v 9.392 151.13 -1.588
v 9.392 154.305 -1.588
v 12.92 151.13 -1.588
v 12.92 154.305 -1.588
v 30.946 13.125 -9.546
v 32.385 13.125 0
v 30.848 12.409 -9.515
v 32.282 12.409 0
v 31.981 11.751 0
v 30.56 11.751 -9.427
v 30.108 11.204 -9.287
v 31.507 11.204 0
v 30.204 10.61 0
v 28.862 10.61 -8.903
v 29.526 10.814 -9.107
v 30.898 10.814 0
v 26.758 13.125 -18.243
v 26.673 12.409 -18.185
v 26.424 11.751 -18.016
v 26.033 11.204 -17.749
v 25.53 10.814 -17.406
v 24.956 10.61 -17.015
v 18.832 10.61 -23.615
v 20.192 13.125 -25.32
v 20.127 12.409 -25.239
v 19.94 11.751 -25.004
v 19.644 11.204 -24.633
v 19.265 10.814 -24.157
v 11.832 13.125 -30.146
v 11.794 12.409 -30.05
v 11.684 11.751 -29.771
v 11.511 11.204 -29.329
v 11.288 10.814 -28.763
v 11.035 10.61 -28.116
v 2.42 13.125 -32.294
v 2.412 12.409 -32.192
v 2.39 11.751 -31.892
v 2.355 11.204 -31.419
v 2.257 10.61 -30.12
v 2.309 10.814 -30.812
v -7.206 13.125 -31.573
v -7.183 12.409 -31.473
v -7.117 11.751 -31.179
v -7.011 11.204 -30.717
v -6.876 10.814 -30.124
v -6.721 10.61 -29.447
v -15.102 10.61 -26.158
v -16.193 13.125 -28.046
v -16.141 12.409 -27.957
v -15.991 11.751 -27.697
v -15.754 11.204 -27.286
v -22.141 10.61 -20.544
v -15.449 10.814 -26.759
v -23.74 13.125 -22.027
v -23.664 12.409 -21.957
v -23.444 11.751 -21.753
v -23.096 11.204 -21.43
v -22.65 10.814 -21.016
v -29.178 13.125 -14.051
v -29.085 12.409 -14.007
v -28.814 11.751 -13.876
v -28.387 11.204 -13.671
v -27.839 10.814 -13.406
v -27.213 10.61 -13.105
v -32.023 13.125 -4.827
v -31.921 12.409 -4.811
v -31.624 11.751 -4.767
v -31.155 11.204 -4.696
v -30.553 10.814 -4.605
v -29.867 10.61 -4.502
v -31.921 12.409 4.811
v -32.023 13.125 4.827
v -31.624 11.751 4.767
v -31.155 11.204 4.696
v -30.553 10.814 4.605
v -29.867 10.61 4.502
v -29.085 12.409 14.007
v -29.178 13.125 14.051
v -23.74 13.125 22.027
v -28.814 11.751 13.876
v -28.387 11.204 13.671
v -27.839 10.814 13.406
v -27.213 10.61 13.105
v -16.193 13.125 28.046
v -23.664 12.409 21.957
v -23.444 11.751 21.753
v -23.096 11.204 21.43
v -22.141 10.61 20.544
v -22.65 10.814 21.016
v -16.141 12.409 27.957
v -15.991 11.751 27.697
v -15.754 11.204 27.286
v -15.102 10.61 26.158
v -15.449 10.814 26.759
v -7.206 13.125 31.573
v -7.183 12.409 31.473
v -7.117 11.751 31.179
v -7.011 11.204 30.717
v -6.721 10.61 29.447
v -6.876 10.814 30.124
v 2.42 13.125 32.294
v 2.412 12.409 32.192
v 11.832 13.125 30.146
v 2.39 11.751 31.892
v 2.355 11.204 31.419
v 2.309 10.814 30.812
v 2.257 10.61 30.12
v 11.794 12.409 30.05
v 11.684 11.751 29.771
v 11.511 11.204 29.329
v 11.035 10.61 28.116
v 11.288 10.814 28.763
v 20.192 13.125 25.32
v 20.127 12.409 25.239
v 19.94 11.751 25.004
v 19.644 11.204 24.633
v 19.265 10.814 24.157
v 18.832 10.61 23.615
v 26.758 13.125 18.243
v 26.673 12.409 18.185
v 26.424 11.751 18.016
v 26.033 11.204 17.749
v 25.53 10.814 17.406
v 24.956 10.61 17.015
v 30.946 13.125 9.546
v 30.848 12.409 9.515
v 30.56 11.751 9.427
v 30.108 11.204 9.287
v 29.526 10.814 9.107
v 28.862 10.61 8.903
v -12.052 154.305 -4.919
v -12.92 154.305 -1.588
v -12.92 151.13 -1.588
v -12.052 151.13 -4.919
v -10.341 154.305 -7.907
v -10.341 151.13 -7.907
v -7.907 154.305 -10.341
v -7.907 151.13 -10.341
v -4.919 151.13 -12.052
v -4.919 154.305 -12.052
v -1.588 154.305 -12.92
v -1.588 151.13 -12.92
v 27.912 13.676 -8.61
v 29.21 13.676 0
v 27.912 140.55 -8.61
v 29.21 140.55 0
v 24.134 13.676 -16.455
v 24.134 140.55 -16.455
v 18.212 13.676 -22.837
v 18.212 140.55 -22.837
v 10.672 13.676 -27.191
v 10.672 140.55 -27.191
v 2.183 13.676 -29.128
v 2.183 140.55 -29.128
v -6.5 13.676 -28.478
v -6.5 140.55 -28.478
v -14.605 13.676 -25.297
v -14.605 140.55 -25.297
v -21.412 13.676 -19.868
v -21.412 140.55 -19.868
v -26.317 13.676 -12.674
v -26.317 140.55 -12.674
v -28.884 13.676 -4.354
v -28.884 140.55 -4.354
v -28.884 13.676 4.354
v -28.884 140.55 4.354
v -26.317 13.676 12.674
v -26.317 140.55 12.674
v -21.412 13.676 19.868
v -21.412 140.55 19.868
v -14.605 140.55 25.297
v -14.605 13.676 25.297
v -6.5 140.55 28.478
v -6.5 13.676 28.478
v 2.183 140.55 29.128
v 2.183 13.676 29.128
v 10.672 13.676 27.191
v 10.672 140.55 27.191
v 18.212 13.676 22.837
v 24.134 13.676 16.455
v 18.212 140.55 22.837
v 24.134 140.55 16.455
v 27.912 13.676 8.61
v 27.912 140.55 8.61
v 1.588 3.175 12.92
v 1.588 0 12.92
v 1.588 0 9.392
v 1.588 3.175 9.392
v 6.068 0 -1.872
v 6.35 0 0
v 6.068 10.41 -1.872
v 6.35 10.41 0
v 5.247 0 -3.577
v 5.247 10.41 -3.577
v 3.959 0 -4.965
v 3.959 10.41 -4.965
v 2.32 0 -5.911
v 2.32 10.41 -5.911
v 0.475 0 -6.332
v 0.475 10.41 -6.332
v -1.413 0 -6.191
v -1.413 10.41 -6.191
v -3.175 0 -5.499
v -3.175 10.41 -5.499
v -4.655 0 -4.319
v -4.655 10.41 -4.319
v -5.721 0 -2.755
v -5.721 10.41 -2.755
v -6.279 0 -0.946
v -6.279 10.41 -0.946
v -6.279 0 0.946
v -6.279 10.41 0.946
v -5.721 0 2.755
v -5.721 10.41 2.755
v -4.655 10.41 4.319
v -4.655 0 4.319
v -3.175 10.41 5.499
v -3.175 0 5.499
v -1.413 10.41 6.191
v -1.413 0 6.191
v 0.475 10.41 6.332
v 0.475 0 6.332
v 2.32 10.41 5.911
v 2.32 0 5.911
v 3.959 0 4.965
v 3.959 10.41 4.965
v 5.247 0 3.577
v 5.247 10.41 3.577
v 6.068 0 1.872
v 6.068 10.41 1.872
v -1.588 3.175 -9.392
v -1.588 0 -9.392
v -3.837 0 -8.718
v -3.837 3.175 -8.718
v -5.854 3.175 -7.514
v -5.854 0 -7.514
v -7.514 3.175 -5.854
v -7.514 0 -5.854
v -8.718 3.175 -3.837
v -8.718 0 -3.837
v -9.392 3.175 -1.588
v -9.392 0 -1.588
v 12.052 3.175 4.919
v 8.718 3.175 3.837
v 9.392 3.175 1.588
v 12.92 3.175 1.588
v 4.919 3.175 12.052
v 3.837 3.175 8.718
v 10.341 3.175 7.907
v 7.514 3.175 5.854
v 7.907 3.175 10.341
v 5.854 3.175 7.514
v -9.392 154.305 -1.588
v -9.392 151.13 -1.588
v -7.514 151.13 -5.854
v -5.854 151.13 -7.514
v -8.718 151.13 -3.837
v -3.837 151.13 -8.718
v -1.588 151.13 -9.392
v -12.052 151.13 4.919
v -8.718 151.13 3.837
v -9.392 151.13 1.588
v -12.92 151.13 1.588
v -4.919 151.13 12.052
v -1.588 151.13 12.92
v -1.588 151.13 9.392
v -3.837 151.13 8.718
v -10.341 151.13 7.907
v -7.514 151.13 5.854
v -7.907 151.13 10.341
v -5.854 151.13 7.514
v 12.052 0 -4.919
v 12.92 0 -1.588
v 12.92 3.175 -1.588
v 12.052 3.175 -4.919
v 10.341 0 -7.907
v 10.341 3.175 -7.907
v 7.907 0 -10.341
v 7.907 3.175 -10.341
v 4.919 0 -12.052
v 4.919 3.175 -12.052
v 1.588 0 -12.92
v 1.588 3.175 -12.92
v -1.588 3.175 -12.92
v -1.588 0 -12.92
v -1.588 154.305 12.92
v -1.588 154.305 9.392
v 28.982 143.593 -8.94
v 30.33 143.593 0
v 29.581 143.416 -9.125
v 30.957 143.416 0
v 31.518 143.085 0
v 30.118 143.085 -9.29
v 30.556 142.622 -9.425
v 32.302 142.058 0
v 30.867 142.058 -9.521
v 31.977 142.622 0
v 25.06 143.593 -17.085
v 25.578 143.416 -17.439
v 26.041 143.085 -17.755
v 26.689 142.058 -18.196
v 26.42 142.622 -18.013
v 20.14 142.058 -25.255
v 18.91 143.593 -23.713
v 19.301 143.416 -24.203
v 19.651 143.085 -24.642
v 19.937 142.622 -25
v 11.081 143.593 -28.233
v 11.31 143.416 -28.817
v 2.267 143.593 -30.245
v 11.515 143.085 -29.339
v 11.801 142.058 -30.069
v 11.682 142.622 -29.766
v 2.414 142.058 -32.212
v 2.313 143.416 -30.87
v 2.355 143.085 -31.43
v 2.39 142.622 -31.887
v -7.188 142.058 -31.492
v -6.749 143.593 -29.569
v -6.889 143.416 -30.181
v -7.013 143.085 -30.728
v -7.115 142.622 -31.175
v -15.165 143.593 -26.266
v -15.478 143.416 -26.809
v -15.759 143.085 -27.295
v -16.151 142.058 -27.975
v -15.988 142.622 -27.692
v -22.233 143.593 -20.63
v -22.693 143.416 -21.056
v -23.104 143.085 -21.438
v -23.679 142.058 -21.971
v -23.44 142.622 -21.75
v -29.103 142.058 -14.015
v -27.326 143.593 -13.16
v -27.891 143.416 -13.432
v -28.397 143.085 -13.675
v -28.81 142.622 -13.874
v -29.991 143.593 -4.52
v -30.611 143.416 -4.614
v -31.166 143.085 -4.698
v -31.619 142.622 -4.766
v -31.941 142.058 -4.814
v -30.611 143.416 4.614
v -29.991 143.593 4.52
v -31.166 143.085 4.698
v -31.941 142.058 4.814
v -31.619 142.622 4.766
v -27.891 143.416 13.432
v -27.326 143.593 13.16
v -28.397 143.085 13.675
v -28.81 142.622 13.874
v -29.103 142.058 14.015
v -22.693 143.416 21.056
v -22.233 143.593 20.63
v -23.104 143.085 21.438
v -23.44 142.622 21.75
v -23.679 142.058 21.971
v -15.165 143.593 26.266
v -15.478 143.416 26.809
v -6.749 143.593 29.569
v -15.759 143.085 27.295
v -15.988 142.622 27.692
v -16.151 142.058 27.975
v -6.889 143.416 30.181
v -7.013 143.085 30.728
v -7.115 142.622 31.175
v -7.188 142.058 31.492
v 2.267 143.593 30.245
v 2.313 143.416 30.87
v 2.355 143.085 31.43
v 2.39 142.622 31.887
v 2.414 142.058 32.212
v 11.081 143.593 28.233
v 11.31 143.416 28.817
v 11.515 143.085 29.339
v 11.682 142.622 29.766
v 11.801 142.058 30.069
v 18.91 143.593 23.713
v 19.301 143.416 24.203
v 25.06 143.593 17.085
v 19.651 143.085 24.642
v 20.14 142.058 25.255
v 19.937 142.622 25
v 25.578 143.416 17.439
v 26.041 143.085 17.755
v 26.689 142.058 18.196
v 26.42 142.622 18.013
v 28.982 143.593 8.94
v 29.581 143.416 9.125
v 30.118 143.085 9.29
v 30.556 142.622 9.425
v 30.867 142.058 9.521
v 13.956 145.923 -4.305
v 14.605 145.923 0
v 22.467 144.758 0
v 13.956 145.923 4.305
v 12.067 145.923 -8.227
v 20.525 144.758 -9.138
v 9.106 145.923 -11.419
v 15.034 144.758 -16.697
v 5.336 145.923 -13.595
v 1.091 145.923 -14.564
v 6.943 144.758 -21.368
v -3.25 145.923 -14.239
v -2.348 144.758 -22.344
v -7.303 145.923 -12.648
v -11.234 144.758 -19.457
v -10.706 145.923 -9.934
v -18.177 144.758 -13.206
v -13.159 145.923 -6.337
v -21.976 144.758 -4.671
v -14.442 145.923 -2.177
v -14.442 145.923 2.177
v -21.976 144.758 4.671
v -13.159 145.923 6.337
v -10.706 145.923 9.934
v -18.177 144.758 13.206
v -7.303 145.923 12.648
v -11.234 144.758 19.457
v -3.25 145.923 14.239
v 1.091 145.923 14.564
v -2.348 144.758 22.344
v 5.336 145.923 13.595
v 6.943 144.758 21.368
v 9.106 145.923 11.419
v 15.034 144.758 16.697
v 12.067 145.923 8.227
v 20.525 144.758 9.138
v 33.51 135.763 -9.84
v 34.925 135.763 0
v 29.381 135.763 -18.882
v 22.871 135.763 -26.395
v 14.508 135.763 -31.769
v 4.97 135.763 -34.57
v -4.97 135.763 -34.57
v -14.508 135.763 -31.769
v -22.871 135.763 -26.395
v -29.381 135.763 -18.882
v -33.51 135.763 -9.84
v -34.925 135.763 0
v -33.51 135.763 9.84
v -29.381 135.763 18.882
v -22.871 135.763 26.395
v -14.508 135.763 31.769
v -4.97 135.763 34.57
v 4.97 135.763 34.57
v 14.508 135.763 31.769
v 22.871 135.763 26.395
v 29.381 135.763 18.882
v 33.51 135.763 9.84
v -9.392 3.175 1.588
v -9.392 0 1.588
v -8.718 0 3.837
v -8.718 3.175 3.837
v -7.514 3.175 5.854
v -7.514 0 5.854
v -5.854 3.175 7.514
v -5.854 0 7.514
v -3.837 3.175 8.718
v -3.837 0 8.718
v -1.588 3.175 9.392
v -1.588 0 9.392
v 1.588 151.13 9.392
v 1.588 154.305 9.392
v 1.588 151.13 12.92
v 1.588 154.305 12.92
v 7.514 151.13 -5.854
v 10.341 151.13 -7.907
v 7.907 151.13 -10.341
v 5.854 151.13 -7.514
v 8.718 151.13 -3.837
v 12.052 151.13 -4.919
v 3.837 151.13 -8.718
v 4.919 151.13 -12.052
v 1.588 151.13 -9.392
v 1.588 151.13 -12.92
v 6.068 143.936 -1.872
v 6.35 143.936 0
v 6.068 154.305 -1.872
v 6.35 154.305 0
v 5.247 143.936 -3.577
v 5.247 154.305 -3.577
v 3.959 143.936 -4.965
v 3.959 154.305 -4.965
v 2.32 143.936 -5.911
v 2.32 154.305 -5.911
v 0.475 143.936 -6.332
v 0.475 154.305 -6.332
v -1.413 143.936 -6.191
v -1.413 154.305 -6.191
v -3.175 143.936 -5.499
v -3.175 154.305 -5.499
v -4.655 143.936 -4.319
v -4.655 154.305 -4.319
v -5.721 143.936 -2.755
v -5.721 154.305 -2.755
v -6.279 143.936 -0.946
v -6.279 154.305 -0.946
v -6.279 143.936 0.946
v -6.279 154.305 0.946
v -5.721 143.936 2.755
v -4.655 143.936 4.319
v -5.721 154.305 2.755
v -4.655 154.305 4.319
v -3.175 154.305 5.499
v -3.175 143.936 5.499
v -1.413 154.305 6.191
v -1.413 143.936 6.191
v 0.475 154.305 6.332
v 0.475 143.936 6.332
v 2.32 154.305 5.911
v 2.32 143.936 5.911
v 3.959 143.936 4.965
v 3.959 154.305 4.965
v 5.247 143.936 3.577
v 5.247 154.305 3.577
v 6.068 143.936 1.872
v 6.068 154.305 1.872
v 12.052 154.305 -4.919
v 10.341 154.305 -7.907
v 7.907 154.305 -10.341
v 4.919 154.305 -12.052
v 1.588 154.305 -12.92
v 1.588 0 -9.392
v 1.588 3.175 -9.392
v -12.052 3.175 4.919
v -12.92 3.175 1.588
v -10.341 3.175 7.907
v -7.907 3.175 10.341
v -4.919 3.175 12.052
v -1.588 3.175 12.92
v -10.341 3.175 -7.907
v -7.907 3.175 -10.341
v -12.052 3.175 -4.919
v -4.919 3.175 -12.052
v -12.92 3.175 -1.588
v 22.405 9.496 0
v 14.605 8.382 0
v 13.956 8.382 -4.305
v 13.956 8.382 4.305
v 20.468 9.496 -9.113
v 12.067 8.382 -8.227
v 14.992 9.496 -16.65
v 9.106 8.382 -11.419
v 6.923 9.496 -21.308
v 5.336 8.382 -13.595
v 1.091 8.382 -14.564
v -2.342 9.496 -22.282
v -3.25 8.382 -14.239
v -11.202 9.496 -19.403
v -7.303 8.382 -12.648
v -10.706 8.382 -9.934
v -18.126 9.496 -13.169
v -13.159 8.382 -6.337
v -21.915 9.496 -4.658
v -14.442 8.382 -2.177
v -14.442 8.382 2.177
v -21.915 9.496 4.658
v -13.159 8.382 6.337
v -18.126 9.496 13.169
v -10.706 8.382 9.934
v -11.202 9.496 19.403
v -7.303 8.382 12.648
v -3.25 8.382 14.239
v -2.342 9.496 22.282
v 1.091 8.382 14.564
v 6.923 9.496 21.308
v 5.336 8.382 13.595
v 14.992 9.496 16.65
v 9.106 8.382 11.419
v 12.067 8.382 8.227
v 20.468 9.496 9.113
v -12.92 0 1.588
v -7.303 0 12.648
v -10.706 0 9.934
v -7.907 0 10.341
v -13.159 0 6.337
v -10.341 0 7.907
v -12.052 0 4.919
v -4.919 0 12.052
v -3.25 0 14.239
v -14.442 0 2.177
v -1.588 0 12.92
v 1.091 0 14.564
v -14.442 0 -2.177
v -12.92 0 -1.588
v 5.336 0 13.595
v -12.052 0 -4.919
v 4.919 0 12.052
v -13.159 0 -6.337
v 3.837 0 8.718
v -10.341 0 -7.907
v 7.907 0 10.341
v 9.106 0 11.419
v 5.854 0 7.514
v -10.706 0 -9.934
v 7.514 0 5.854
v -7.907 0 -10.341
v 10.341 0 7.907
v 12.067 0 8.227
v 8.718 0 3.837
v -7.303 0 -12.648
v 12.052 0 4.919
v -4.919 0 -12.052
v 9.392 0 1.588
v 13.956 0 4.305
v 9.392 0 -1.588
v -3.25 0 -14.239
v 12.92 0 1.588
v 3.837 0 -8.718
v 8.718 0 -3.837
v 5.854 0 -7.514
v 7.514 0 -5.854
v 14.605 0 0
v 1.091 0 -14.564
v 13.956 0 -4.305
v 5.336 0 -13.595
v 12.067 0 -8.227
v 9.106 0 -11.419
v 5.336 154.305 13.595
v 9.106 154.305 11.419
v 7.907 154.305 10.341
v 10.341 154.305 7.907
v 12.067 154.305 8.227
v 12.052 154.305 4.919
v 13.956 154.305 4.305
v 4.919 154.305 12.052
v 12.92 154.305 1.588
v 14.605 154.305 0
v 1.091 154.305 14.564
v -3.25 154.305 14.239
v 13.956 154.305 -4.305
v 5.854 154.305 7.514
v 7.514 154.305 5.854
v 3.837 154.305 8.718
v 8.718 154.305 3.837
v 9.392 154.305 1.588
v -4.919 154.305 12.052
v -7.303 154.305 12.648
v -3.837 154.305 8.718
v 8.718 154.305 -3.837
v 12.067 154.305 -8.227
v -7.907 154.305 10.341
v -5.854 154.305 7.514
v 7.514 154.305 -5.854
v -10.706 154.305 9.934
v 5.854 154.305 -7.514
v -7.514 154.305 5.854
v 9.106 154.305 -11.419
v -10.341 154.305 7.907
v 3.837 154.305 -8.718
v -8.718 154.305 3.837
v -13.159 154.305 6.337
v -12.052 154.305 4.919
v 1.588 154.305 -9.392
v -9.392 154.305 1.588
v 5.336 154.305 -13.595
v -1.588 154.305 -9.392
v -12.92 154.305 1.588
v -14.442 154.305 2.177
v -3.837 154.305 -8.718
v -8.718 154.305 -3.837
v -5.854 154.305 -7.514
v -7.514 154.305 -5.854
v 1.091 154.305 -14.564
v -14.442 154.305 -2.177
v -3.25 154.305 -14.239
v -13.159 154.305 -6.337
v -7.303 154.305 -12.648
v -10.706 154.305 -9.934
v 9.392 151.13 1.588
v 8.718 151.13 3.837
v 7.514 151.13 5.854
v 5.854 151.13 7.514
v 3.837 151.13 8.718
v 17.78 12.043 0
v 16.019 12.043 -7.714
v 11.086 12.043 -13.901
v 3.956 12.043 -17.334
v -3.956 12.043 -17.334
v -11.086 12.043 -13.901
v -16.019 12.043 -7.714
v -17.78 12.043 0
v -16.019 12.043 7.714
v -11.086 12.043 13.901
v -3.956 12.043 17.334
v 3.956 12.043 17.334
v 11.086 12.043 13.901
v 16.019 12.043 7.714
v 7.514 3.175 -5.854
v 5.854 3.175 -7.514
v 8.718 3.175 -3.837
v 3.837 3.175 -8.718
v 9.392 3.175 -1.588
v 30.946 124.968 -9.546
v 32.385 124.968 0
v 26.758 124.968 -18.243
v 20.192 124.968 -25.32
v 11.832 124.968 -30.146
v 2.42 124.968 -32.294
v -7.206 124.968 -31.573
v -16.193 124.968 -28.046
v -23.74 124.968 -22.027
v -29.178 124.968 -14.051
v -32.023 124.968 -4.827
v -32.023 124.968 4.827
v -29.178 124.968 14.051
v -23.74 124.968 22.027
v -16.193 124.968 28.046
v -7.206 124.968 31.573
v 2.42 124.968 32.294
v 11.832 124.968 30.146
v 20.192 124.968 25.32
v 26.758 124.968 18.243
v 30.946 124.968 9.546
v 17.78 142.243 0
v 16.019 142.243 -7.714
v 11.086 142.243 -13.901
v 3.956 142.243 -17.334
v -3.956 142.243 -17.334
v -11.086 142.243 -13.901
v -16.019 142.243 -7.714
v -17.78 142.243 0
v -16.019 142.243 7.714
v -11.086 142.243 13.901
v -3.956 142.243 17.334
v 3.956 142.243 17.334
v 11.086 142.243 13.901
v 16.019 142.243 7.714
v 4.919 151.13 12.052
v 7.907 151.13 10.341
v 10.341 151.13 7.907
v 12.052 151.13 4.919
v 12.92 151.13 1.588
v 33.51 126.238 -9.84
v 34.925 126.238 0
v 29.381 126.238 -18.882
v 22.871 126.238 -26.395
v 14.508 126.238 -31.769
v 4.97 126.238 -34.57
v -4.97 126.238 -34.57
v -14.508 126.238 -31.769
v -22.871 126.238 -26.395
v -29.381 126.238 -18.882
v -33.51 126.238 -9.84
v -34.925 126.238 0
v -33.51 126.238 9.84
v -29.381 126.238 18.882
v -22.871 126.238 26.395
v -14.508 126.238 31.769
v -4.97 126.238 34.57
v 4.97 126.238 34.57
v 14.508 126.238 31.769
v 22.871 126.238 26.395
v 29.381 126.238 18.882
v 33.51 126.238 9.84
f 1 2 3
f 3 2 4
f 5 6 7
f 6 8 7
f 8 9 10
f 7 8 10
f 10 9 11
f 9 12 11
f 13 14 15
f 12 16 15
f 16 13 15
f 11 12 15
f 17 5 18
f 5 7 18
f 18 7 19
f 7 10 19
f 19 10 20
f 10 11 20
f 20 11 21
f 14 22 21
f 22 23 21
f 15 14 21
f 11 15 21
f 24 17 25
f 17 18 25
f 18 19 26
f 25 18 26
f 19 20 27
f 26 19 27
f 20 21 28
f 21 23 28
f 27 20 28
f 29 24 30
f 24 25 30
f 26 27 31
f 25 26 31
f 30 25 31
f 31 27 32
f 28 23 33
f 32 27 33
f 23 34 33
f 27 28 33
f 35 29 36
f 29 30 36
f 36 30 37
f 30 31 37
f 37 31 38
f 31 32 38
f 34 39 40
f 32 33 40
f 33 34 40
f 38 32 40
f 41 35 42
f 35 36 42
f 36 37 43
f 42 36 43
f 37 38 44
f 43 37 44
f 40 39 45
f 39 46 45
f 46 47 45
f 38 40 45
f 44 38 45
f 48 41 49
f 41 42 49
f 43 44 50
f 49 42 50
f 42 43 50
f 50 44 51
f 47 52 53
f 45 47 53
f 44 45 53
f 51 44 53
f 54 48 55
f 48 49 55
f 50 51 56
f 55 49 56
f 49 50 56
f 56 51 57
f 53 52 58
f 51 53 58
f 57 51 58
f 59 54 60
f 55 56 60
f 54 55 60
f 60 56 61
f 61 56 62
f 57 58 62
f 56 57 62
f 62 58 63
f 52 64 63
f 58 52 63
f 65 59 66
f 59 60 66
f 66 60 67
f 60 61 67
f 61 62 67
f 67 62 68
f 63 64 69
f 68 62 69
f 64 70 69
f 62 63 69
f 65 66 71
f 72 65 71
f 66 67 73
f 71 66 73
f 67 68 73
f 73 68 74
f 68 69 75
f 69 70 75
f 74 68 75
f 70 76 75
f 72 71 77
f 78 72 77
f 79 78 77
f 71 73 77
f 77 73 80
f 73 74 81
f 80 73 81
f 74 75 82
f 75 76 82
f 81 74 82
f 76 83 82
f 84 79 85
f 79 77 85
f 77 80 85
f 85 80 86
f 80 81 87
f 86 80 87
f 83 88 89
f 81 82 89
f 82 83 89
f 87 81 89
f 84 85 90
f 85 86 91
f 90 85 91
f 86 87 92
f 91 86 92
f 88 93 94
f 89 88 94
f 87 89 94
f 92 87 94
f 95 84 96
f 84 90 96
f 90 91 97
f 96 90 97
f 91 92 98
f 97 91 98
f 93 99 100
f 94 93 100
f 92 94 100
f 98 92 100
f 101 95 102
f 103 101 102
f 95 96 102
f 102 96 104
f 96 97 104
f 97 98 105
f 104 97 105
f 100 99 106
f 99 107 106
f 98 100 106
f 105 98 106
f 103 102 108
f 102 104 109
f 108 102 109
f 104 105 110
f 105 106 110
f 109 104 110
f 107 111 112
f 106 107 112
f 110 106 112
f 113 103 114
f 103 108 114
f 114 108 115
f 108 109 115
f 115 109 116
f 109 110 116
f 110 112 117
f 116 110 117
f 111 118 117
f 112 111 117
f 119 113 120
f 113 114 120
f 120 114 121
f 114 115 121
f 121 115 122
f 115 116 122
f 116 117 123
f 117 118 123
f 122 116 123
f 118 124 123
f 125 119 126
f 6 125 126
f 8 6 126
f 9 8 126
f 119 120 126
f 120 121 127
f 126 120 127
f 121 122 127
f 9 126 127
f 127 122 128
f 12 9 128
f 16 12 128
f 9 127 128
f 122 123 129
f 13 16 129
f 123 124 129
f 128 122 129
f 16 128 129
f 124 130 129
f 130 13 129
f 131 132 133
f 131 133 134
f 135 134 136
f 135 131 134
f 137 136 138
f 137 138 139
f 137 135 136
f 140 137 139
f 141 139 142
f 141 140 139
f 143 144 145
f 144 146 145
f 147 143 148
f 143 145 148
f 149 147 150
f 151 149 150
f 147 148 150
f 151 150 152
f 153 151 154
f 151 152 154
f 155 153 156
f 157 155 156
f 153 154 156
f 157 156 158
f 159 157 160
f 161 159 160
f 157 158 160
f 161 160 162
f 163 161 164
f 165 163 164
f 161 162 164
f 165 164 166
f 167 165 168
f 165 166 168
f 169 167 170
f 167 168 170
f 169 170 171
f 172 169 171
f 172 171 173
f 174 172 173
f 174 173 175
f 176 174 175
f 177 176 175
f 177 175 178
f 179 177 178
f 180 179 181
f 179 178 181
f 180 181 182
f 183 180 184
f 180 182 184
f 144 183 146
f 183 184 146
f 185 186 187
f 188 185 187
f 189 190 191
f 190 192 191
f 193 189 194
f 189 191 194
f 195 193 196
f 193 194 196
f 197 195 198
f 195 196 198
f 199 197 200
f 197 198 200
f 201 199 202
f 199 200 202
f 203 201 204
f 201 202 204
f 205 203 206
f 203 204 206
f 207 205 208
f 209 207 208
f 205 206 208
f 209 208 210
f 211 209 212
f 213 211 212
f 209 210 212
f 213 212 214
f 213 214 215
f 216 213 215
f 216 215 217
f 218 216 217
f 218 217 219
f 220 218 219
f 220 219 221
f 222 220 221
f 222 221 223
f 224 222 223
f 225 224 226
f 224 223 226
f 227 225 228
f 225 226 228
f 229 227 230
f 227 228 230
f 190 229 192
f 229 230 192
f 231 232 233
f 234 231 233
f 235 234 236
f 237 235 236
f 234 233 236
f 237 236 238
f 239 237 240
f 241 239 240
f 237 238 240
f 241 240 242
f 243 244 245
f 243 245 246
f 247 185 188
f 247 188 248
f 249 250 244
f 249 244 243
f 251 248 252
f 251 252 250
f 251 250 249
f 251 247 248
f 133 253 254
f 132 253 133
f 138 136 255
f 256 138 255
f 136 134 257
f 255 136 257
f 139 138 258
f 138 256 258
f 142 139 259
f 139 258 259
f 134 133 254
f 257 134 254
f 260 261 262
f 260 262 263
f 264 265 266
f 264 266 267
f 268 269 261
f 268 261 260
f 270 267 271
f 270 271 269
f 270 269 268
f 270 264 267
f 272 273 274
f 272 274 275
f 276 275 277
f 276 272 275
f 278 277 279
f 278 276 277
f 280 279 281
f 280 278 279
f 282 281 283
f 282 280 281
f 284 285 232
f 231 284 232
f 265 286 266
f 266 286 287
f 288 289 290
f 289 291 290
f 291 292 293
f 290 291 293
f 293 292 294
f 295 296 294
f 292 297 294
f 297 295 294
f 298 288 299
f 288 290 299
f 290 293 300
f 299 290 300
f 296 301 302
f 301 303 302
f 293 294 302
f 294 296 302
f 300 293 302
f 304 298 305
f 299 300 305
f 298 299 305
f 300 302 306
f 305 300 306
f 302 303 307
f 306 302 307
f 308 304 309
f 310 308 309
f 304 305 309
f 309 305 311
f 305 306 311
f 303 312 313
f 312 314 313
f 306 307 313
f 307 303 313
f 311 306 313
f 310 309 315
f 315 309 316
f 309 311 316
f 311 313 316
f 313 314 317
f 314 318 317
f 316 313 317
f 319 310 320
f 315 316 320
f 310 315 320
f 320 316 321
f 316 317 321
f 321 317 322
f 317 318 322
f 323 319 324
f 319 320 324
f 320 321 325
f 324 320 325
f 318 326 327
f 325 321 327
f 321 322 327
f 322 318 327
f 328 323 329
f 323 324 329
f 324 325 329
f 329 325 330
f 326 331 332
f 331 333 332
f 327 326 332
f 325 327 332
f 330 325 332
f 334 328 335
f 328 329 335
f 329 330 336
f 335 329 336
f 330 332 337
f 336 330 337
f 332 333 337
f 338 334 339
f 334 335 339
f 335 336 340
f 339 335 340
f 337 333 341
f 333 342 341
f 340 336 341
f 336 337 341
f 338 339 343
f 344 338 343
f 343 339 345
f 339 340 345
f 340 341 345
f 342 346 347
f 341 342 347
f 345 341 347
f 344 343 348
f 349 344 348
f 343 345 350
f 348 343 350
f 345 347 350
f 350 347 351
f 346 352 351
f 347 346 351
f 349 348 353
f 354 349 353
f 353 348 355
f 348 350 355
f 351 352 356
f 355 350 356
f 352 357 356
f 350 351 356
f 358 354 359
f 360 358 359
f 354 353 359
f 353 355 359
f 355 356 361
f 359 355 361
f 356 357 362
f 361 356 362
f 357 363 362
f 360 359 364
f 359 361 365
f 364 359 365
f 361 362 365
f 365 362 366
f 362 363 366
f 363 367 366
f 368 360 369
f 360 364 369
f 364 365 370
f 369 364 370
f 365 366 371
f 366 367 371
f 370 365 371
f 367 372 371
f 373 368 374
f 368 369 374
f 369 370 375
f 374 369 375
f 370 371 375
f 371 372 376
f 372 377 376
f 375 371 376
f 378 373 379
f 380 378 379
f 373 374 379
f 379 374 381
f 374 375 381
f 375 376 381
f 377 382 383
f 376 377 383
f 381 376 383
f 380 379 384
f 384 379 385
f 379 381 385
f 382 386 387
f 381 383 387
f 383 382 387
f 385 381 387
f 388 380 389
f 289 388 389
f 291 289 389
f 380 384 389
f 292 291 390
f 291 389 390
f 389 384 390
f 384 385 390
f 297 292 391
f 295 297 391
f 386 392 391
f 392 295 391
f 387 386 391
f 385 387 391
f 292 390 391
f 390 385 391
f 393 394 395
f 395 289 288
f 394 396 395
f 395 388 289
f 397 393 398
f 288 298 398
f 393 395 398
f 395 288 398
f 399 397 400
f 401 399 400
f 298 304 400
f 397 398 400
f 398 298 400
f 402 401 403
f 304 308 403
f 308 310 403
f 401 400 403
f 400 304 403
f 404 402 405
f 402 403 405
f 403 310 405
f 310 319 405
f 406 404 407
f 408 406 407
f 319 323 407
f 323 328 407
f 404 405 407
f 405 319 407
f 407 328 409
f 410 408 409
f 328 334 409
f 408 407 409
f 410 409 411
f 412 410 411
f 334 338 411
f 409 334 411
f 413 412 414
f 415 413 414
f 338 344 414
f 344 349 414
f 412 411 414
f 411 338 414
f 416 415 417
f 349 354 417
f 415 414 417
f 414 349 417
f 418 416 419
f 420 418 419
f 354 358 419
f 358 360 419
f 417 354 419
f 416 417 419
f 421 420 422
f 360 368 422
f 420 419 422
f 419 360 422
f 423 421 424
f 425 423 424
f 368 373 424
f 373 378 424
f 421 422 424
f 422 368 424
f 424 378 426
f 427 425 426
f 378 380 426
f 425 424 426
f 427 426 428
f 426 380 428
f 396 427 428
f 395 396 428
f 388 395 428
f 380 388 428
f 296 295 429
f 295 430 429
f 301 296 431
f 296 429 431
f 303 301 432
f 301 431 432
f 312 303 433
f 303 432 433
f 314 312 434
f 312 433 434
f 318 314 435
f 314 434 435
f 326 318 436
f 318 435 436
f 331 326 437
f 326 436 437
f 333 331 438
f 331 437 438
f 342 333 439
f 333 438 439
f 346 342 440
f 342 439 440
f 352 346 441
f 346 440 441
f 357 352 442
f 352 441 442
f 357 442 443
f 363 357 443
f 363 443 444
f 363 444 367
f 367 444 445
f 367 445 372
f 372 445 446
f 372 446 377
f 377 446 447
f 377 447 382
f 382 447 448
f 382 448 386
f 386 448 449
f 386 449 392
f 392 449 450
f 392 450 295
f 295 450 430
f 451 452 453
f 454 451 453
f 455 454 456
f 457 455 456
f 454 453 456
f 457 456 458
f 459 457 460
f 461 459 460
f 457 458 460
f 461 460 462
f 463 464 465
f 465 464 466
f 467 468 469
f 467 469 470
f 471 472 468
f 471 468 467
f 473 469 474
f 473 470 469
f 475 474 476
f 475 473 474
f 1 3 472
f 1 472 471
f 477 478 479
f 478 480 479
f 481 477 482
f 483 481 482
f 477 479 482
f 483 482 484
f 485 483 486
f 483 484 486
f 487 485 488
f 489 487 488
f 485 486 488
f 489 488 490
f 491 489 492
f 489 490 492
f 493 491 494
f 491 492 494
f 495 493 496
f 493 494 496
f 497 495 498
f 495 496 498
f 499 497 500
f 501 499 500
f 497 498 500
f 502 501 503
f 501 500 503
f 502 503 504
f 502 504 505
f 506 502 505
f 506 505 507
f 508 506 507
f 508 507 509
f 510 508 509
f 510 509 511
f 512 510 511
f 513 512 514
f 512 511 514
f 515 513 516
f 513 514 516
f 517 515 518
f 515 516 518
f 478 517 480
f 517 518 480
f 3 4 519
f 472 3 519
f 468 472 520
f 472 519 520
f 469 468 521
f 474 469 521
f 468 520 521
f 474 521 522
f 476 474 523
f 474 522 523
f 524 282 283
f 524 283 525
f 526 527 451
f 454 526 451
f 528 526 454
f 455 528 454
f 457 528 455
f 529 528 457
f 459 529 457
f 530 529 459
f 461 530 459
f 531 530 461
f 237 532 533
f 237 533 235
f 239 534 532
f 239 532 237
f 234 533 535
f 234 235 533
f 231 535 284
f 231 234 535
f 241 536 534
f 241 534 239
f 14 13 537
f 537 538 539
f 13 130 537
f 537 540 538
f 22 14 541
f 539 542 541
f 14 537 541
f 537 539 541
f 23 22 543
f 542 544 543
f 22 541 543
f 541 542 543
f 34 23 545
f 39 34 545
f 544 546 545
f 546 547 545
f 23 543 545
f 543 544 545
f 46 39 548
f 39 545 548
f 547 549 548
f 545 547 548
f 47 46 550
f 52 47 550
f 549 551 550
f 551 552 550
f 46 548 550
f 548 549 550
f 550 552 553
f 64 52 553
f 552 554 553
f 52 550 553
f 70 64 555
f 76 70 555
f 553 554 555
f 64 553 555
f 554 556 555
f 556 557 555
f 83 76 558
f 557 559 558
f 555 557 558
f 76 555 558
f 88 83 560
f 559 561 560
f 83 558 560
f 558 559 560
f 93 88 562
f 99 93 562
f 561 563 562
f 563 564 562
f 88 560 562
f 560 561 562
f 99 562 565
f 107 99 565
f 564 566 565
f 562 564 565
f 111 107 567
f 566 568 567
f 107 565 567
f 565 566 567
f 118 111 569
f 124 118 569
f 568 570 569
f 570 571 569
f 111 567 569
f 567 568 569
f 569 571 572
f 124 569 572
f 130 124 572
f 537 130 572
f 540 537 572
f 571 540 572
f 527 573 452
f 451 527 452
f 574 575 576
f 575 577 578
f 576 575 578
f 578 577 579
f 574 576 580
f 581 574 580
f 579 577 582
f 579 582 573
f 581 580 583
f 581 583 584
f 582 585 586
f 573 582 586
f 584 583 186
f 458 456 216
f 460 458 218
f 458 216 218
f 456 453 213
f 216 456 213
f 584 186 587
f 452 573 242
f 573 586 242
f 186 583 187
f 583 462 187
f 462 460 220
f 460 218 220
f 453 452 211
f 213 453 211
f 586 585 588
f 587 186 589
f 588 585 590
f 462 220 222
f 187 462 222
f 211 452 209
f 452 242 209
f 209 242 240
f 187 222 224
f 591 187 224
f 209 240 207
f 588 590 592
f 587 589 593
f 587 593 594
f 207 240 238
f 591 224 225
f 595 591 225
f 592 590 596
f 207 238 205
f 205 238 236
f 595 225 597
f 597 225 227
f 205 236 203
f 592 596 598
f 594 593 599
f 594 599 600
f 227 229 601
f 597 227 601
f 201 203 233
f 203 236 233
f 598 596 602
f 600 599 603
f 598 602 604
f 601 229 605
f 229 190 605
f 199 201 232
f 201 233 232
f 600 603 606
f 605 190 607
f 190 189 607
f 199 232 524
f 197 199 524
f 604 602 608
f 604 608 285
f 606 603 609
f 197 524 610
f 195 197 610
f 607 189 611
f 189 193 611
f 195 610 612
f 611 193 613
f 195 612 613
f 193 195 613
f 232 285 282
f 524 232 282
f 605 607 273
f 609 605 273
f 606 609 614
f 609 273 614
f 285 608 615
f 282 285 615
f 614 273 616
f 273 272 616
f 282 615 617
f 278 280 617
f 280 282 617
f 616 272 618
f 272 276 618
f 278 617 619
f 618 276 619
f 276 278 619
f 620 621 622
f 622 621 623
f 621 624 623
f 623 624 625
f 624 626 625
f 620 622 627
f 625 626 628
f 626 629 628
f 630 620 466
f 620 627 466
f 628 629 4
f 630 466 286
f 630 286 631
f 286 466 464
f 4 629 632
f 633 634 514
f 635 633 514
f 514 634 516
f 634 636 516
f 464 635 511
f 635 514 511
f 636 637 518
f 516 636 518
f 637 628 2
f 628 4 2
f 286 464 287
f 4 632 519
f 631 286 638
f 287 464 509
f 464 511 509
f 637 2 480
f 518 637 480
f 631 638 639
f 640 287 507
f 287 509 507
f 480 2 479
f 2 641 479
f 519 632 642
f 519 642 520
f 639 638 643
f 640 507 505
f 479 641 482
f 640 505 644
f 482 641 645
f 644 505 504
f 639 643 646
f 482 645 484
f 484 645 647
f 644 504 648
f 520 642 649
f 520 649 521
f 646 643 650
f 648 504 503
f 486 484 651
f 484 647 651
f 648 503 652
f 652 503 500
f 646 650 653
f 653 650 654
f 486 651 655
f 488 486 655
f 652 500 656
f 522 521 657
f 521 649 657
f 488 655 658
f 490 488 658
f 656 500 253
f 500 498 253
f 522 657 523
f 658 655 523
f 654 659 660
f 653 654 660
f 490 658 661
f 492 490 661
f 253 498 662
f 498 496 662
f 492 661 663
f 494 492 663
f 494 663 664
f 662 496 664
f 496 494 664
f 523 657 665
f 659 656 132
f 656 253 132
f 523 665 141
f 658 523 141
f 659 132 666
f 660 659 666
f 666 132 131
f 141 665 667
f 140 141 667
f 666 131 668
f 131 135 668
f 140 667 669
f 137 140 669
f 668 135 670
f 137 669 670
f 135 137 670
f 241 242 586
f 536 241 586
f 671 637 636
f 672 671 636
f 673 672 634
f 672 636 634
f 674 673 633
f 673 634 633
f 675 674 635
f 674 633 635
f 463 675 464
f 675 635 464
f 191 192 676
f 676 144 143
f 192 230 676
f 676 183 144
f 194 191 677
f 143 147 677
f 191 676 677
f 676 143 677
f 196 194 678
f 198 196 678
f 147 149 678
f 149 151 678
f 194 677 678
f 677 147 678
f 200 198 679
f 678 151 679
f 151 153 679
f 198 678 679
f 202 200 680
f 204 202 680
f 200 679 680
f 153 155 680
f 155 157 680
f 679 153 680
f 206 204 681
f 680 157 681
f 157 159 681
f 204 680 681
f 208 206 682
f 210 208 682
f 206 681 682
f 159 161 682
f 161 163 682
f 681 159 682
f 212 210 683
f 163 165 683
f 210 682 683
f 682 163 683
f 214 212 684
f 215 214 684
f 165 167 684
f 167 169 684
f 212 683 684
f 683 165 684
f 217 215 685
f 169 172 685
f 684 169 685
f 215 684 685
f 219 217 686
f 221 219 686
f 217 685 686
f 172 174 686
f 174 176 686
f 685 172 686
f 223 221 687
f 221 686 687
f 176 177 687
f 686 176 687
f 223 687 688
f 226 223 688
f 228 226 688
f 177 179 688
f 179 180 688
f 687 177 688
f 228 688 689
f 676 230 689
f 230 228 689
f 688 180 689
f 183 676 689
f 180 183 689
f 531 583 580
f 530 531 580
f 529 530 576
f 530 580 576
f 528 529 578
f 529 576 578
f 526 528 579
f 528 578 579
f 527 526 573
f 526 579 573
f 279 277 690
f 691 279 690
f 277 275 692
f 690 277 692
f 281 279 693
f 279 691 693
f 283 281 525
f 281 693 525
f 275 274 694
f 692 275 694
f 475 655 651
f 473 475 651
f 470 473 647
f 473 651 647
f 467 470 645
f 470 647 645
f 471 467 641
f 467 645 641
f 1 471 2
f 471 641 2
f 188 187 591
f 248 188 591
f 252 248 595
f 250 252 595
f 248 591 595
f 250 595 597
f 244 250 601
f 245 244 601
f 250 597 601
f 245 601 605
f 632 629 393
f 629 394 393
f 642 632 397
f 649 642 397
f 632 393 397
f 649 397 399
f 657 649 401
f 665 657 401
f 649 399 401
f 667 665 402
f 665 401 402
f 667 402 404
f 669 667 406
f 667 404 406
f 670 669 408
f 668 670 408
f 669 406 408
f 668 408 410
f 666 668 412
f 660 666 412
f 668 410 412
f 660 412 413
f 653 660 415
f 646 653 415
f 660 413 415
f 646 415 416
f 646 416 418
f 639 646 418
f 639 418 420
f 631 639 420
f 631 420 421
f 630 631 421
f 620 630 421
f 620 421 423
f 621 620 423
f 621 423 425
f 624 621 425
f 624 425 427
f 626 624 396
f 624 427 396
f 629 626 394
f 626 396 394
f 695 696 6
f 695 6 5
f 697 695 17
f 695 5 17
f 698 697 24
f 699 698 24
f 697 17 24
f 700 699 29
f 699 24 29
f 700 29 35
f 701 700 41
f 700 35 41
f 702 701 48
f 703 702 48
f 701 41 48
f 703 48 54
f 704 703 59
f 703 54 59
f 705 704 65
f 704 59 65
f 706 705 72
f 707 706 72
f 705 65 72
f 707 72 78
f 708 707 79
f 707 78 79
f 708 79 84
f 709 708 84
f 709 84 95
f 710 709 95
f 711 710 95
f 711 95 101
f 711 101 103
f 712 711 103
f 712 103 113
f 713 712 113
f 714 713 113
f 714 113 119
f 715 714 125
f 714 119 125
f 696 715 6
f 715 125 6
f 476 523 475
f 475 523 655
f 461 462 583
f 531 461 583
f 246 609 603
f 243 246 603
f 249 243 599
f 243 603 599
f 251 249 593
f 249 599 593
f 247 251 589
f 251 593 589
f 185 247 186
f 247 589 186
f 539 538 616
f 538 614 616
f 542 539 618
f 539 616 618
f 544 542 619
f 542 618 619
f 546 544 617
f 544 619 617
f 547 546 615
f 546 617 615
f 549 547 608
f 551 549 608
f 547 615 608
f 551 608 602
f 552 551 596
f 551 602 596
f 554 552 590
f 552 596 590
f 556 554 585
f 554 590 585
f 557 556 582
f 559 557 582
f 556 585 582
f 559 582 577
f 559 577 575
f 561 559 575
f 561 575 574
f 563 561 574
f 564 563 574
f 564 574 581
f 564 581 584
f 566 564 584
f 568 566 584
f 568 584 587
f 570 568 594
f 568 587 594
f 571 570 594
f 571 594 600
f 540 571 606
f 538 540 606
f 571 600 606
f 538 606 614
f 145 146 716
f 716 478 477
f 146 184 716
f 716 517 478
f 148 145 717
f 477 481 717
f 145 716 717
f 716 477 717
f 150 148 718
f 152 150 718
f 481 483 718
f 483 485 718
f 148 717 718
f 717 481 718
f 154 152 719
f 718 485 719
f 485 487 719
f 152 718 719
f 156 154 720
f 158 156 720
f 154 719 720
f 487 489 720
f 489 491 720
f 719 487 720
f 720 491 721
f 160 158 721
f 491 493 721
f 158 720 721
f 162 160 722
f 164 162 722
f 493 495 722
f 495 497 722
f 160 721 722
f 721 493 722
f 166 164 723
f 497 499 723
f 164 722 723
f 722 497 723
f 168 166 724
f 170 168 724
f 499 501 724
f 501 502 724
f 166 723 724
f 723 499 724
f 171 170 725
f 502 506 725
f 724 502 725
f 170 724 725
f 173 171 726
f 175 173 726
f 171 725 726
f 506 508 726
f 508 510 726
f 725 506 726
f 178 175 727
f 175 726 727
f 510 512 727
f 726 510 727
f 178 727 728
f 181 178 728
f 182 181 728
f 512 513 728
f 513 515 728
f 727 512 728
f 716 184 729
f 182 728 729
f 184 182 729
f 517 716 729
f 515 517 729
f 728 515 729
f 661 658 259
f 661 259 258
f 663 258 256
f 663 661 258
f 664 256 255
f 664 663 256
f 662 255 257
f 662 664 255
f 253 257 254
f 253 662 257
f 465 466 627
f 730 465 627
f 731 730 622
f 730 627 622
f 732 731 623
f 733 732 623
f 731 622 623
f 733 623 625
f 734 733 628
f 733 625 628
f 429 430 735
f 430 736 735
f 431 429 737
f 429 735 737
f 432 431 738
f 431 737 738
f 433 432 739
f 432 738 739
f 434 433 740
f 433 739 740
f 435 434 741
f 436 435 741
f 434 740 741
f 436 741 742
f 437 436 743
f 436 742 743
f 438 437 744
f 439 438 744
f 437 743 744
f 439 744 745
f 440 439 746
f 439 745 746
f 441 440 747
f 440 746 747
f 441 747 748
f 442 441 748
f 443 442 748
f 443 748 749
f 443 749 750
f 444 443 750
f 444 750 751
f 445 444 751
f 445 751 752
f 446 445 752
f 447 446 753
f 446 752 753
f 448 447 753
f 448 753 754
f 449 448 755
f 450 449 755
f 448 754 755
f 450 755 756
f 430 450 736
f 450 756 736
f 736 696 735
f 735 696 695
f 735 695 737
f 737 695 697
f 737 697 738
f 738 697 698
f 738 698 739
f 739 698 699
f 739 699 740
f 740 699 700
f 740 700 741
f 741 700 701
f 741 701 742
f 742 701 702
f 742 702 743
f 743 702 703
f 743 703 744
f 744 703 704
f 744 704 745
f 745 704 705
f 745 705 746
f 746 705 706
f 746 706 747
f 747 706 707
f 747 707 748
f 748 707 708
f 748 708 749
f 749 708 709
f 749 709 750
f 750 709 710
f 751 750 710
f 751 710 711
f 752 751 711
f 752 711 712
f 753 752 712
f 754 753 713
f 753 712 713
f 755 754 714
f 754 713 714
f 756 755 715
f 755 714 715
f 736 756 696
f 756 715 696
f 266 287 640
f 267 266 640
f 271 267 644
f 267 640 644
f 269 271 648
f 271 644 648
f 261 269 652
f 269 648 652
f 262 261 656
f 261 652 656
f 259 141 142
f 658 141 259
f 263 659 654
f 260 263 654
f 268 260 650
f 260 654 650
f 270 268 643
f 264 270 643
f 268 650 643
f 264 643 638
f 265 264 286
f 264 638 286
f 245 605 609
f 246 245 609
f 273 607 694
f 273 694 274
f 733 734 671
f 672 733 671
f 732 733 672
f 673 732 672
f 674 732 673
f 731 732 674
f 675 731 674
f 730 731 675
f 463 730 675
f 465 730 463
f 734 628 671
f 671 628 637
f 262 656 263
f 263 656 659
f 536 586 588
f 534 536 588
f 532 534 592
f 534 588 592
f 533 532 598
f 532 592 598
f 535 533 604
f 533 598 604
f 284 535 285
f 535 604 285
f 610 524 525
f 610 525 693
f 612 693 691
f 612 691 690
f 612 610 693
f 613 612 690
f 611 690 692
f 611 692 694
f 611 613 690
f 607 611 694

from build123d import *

# Parameters (mm, degrees)
CUT_EXTRUDE2_DEPTH = 3.175
CUT_EXTRUDE3_DEPTH = 3.175


with BuildPart() as part:
    # Sketch1 → Revolve1 (revolve)
    with BuildSketch(Plane.XY):
        with BuildLine():
            Line((6.35, 154.305), (14.605, 154.305))
            Line((14.605, 154.305), (14.605, 145.923))
            Line((14.605, 145.923), (30.329807741, 143.593398853))
            ThreePointArc((30.329807741, 143.593398853), (31.517982802, 143.084998901), (32.302189527, 142.057745136))
            Line((32.302189527, 142.057745136), (34.925, 135.763))
            Line((34.925, 135.763), (34.925, 126.238))
            Line((34.925, 126.238), (32.385, 124.968))
            Line((32.385, 124.968), (32.385, 13.12493032))
            ThreePointArc((32.385, 13.12493032), (31.763853046, 11.460717897), (30.204210245, 10.610458606))
            Line((30.204210245, 10.610458606), (14.605, 8.382))
            Line((14.605, 8.382), (14.605, 0))
            Line((14.605, 0), (6.35, 0))
            Line((6.35, 0), (6.35, 10.409948615))
            Line((6.35, 10.409948615), (29.21, 13.6756629))
            Line((29.21, 13.6756629), (29.21, 140.549643155))
            Line((29.21, 140.549643155), (6.35, 143.936309822))
            Line((6.35, 143.936309822), (6.35, 154.305))
        make_face()
    revolve(axis=Axis((0, 0, 0), (0, 1, 0)))

    # Sketch2 → Cut-Extrude2 (cut)
    with BuildSketch(Plane.XZ):
        with BuildLine():
            Line((1.5875, -12.920338618), (1.5875, -9.391776656))
            ThreePointArc((1.5875, -9.391776656), (6.735192091, -6.735192091), (9.391776656, -1.5875))
            Line((9.391776656, -1.5875), (12.920338618, -1.5875))
            ThreePointArc((12.920338618, -1.5875), (9.204762524, -9.204762524), (1.5875, -12.920338618))
        make_face()
        with BuildLine():
            Line((-1.5875, -12.920338618), (-1.5875, -9.391776656))
            ThreePointArc((-1.5875, -9.391776656), (-6.735192091, -6.735192091), (-9.391776656, -1.5875))
            Line((-9.391776656, -1.5875), (-12.920338618, -1.5875))
            ThreePointArc((-12.920338618, -1.5875), (-9.204762524, -9.204762524), (-1.5875, -12.920338618))
        make_face()
        with BuildLine():
            Line((-12.920338618, 1.5875), (-9.391776656, 1.5875))
            ThreePointArc((-9.391776656, 1.5875), (-6.735192091, 6.735192091), (-1.5875, 9.391776656))
            Line((-1.5875, 9.391776656), (-1.5875, 12.920338618))
            ThreePointArc((-1.5875, 12.920338618), (-9.204762524, 9.204762524), (-12.920338618, 1.5875))
        make_face()
        with BuildLine():
            Line((1.5875, 12.920338618), (1.5875, 9.391776656))
            ThreePointArc((1.5875, 9.391776656), (6.735192091, 6.735192091), (9.391776656, 1.5875))
            Line((9.391776656, 1.5875), (12.920338618, 1.5875))
            ThreePointArc((12.920338618, 1.5875), (9.204762524, 9.204762524), (1.5875, 12.920338618))
        make_face()
    extrude(amount=-CUT_EXTRUDE2_DEPTH, mode=Mode.SUBTRACT)

    # Sketch3 → Cut-Extrude3 (cut)
    with BuildSketch(Plane(origin=(0, 154.305, 0), x_dir=(-1, 0, 0), z_dir=(0, 1, 0))):
        with BuildLine():
            Line((1.5875, -12.920338618), (1.5875, -9.391776656))
            ThreePointArc((1.5875, -9.391776656), (6.735192091, -6.735192091), (9.391776656, -1.5875))
            Line((9.391776656, -1.5875), (12.920338618, -1.5875))
            ThreePointArc((12.920338618, -1.5875), (9.204762524, -9.204762524), (1.5875, -12.920338618))
        make_face()
        with BuildLine():
            Line((-1.5875, -12.920338618), (-1.5875, -9.391776656))
            ThreePointArc((-1.5875, -9.391776656), (-6.735192091, -6.735192091), (-9.391776656, -1.5875))
            Line((-9.391776656, -1.5875), (-12.920338618, -1.5875))
            ThreePointArc((-12.920338618, -1.5875), (-9.204762524, -9.204762524), (-1.5875, -12.920338618))
        make_face()
        with BuildLine():
            Line((-12.920338618, 1.5875), (-9.391776656, 1.5875))
            ThreePointArc((-9.391776656, 1.5875), (-6.735192091, 6.735192091), (-1.5875, 9.391776656))
            Line((-1.5875, 9.391776656), (-1.5875, 12.920338618))
            ThreePointArc((-1.5875, 12.920338618), (-9.204762524, 9.204762524), (-12.920338618, 1.5875))
        make_face()
        with BuildLine():
            Line((1.5875, 12.920338618), (1.5875, 9.391776656))
            ThreePointArc((1.5875, 9.391776656), (6.735192091, 6.735192091), (9.391776656, 1.5875))
            Line((9.391776656, 1.5875), (12.920338618, 1.5875))
            ThreePointArc((12.920338618, 1.5875), (9.204762524, 9.204762524), (1.5875, 12.920338618))
        make_face()
    extrude(amount=-CUT_EXTRUDE3_DEPTH, mode=Mode.SUBTRACT)


solid = part.part
